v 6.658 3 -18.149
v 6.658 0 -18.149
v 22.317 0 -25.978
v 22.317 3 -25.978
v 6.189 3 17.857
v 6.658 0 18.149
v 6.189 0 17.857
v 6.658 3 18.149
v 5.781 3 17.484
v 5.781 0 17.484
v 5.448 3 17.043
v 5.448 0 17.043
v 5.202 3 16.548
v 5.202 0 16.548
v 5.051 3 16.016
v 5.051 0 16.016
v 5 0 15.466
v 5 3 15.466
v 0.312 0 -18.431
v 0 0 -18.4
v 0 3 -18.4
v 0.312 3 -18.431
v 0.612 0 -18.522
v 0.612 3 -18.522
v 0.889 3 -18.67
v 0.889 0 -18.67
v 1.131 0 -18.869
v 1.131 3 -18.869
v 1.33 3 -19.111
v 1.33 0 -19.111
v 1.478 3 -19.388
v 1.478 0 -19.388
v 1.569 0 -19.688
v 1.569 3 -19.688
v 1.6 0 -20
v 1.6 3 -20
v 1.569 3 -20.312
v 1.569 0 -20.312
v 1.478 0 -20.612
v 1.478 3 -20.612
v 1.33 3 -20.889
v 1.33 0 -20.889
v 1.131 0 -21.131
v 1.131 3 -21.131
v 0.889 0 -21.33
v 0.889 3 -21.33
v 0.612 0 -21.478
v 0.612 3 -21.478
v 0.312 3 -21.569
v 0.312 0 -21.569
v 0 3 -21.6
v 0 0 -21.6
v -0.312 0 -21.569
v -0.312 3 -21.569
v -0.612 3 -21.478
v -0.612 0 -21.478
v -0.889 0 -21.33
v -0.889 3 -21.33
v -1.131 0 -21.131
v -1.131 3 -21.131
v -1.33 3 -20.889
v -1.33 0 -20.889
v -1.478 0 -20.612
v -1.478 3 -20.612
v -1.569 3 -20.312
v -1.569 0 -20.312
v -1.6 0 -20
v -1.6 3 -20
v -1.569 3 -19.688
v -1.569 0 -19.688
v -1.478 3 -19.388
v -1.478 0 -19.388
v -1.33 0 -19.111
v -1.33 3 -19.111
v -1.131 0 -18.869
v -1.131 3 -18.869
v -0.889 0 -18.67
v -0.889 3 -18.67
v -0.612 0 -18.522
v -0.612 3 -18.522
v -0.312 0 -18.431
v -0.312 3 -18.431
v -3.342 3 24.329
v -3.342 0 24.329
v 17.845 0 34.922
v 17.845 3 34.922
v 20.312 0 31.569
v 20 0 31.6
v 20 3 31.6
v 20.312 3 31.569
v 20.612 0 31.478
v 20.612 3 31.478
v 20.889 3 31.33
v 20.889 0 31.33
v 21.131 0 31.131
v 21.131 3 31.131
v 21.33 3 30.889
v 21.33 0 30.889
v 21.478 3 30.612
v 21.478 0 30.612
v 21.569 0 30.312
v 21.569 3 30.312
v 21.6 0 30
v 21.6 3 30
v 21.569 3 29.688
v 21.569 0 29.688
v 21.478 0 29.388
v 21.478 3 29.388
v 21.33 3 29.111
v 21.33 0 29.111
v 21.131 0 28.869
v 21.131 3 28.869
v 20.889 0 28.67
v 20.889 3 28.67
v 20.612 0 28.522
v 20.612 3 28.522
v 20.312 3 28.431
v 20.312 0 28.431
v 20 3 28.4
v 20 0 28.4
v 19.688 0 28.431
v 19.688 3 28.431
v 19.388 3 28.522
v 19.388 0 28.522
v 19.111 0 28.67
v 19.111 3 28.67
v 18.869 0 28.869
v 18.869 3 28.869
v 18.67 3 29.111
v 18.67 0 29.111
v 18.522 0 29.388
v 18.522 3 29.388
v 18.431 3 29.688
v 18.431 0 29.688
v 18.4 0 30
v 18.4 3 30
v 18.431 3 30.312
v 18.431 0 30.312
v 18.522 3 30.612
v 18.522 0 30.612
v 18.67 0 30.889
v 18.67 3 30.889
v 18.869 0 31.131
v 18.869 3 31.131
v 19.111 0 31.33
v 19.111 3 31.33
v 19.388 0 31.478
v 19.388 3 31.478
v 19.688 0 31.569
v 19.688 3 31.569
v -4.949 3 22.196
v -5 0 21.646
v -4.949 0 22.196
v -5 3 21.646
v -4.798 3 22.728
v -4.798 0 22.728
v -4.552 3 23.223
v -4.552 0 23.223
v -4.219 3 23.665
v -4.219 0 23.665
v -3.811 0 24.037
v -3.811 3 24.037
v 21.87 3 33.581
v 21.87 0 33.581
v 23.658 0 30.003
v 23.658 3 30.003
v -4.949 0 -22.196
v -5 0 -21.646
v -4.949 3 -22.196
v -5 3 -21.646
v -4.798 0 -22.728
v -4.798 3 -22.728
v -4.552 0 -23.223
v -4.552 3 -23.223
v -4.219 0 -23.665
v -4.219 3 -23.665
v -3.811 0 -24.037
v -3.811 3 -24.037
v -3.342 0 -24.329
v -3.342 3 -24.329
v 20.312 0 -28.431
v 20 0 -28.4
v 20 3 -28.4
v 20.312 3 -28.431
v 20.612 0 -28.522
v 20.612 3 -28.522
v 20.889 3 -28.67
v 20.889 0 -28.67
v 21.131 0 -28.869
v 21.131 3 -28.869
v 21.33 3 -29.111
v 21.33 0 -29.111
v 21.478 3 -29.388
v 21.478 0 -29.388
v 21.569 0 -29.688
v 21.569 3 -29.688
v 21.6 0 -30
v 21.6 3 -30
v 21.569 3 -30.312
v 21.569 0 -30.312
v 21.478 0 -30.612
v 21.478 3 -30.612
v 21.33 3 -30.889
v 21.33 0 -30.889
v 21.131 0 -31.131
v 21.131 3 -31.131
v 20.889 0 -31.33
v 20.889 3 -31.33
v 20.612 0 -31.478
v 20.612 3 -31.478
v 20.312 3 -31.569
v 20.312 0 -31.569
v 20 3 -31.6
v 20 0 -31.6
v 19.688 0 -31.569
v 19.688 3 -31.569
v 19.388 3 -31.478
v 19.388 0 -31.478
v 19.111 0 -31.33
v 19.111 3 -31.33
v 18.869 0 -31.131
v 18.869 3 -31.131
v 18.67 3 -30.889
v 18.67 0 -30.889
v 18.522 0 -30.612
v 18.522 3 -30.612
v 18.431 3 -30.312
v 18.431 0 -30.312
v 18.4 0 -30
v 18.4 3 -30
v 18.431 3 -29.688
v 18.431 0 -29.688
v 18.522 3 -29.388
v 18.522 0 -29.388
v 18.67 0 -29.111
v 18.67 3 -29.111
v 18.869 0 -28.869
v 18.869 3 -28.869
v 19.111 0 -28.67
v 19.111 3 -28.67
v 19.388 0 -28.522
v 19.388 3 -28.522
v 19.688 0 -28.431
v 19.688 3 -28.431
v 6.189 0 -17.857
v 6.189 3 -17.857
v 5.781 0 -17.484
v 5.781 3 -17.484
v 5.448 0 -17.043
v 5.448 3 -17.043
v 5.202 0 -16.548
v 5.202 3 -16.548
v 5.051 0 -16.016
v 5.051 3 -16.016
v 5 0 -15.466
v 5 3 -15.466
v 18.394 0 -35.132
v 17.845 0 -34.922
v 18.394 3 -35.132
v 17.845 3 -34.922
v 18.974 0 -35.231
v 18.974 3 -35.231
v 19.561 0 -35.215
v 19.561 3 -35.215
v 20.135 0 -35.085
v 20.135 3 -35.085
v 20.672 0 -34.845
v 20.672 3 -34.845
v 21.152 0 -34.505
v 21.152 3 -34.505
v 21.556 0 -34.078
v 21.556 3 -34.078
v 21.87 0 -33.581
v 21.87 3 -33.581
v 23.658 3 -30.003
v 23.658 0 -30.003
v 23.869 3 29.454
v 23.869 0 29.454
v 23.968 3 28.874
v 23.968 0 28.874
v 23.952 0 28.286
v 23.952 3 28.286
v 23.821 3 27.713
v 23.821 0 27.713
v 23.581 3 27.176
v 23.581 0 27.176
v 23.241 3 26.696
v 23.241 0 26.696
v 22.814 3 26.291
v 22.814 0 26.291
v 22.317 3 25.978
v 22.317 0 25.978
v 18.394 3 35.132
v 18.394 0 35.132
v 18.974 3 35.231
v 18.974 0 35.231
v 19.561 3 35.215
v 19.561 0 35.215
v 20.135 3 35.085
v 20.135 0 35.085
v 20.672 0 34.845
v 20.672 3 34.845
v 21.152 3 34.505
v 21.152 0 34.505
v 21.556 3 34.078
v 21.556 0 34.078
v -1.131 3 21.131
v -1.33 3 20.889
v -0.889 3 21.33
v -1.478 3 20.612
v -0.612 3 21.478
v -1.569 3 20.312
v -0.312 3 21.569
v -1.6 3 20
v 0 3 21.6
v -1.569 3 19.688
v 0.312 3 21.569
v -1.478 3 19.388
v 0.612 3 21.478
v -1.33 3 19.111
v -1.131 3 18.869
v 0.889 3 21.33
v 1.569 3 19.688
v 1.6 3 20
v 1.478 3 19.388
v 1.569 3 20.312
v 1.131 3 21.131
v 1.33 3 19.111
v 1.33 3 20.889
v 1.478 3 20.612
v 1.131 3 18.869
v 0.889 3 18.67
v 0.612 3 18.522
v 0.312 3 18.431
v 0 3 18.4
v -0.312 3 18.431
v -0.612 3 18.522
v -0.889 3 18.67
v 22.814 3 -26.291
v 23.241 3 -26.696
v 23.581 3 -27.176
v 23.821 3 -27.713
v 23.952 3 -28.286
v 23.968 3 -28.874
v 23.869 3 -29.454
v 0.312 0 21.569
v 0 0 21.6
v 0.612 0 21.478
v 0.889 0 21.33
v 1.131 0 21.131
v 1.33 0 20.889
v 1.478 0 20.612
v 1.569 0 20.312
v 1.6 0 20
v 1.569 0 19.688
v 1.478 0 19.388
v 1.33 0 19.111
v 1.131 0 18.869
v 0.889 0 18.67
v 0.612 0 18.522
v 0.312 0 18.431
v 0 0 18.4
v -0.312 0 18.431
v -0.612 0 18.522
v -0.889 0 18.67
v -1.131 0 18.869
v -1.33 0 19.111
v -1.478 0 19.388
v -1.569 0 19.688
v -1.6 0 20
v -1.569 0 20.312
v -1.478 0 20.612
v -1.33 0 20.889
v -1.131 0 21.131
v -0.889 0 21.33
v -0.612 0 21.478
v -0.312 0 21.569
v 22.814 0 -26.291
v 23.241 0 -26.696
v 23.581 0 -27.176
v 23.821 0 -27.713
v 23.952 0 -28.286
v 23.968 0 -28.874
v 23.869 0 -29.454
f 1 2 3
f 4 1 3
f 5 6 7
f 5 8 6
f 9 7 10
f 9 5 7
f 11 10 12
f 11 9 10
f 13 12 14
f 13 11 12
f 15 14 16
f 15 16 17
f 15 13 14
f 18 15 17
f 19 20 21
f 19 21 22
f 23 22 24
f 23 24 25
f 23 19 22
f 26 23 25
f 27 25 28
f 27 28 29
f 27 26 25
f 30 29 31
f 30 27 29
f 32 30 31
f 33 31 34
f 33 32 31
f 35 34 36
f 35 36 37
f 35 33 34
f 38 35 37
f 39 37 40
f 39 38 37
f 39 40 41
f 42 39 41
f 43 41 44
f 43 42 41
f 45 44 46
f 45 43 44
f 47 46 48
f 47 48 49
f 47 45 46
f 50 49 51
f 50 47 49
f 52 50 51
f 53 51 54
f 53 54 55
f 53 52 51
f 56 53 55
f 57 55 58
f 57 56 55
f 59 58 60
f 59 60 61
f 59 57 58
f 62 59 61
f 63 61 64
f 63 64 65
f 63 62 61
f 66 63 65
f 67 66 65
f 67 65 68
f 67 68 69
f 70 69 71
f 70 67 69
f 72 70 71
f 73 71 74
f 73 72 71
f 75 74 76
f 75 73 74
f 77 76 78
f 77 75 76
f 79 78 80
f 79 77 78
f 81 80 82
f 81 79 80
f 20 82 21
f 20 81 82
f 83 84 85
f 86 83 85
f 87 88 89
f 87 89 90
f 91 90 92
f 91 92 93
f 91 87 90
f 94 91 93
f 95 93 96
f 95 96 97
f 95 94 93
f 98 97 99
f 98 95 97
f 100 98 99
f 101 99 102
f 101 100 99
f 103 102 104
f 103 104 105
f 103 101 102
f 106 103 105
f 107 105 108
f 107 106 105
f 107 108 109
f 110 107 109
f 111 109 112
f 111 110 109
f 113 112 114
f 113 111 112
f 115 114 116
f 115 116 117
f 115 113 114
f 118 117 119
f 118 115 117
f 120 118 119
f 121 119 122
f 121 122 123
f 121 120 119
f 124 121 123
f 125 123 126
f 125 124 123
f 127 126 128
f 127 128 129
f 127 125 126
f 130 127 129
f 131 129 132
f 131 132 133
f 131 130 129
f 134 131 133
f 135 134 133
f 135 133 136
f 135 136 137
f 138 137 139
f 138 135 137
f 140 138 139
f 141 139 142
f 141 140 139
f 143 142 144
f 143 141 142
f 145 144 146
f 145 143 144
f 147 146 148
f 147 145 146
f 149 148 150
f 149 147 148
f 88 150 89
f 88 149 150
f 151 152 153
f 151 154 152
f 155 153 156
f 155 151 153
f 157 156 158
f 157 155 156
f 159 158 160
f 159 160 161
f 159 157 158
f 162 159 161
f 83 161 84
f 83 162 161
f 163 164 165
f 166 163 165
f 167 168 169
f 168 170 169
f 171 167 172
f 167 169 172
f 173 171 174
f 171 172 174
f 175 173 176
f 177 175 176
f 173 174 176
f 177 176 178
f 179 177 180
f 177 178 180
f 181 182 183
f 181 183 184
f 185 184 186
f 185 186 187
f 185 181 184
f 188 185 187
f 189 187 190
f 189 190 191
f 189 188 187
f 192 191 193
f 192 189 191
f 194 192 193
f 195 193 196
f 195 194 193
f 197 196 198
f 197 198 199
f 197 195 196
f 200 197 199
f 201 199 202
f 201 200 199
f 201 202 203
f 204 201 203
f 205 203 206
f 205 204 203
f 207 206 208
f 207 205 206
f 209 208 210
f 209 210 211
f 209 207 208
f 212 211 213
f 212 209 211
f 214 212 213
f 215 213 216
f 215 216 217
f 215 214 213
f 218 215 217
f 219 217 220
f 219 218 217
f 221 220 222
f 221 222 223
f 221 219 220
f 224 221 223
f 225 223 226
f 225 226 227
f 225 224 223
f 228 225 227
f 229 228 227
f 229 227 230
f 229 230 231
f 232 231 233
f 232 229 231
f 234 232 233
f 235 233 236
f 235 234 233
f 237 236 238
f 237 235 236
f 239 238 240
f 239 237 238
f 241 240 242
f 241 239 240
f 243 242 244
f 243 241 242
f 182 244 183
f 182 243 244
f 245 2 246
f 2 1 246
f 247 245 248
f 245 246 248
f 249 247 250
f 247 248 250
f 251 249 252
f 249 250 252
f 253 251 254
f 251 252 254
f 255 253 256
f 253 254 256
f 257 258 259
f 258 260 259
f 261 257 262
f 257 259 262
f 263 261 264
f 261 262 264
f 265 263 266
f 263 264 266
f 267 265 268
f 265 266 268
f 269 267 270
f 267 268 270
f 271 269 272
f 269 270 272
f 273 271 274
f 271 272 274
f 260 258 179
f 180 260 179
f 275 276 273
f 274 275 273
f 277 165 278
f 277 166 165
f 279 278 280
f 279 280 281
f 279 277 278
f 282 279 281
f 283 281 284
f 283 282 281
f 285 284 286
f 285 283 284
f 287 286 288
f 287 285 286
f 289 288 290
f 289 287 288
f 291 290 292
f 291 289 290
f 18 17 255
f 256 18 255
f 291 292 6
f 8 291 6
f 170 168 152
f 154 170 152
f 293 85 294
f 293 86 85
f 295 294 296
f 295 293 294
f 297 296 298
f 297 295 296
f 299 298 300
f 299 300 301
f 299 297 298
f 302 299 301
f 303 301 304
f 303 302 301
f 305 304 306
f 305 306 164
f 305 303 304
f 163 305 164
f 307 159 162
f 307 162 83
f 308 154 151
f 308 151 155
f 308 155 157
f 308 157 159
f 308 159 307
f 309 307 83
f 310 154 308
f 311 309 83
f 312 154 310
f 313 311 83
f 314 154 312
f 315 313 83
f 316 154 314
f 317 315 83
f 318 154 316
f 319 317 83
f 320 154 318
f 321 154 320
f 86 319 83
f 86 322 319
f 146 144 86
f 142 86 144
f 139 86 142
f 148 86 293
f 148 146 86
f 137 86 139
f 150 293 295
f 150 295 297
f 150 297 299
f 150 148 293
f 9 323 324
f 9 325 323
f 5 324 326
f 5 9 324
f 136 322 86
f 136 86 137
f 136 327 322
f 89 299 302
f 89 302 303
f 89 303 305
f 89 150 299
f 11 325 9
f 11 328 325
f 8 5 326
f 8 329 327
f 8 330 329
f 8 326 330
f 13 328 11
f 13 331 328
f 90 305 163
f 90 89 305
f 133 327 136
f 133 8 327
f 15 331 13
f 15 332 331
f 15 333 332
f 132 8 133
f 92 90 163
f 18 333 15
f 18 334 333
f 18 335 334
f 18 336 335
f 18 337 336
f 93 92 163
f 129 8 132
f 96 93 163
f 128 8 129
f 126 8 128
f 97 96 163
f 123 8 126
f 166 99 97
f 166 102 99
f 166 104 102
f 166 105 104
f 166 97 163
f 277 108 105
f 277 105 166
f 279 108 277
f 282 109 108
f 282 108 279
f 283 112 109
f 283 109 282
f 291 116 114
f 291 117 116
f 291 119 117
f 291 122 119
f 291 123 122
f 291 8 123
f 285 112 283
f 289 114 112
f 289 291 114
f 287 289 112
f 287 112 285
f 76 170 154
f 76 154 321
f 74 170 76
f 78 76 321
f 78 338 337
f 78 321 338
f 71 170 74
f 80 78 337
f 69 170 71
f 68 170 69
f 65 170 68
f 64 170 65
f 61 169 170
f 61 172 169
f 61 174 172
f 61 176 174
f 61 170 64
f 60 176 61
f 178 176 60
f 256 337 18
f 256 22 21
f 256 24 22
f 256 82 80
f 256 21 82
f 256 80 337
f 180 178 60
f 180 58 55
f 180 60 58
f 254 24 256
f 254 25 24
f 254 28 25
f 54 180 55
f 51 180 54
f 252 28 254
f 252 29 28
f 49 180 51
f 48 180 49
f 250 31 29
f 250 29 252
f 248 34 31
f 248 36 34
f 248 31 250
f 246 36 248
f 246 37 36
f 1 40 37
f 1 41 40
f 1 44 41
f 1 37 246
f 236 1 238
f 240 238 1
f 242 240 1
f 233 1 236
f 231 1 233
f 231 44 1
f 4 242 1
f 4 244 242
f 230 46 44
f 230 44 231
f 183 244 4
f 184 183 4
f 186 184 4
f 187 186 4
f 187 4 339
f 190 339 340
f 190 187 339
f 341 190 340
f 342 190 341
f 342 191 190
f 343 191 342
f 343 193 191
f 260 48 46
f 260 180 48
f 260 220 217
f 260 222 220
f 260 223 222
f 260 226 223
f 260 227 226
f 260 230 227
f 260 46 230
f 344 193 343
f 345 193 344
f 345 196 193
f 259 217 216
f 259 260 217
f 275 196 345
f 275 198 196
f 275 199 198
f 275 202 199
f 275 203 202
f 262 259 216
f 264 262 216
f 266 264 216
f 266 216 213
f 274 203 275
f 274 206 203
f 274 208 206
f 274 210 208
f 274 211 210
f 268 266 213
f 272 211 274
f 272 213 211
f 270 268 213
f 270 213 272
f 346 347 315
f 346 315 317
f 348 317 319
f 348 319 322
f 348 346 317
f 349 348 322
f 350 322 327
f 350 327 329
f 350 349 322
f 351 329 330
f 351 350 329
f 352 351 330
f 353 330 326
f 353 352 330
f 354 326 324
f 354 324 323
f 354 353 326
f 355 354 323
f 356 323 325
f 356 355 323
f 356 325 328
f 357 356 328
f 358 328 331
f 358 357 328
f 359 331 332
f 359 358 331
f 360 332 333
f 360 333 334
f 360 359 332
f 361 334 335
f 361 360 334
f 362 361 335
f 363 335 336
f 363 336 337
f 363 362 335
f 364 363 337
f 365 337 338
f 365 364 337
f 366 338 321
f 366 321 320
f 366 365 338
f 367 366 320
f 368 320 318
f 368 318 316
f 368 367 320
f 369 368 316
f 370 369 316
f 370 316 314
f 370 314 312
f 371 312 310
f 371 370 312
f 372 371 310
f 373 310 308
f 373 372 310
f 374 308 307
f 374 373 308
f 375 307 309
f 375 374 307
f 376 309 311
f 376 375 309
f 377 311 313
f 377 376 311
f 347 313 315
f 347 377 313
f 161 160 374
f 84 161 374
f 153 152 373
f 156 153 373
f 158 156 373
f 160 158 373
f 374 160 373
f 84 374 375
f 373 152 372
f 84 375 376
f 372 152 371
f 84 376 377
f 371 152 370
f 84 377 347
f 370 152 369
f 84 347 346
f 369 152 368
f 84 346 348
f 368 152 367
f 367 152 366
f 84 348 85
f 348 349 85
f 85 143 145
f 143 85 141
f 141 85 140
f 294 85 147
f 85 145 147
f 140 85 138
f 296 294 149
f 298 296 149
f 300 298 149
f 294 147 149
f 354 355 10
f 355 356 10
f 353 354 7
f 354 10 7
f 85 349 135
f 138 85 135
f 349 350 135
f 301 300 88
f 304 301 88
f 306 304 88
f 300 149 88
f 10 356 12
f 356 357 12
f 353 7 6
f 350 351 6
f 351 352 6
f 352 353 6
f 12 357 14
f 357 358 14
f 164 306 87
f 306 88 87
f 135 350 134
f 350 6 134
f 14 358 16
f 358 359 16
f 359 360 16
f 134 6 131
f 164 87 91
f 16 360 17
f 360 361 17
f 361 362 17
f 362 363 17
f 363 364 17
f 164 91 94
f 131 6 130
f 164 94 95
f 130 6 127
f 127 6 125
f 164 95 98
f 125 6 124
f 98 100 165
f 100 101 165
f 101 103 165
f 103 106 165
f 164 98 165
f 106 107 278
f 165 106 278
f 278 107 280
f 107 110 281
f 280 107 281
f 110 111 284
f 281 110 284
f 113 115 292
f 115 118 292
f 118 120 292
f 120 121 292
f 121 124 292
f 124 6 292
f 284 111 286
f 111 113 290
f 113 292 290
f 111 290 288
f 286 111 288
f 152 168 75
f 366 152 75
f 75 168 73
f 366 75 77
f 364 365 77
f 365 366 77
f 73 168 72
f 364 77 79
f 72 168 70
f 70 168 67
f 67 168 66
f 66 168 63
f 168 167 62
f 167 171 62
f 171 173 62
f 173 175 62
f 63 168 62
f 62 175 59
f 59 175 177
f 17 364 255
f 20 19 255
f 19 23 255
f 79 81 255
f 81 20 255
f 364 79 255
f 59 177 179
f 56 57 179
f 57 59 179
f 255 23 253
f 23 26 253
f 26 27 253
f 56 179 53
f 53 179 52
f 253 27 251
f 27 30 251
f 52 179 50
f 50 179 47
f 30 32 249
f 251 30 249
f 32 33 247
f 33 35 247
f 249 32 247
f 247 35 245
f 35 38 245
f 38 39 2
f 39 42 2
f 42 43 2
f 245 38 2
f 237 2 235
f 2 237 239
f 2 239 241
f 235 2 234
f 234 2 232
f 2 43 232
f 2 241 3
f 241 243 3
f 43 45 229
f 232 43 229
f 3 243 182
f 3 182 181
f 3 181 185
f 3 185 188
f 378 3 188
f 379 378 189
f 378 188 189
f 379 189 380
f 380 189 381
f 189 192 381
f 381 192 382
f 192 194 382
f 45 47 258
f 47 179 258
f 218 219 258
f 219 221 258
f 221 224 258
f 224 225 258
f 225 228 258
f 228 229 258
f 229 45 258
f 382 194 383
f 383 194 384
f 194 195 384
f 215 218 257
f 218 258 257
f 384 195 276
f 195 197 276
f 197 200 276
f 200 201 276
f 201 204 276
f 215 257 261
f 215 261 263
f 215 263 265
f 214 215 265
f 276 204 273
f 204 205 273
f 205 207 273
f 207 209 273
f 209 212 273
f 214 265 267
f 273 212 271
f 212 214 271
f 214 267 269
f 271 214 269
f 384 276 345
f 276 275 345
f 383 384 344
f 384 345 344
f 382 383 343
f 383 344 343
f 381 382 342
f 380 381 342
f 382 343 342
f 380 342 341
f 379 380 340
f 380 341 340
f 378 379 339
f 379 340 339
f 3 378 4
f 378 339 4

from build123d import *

# Parameters (mm, degrees)
CROQUIS1_R              = 1.6
SALIENTE_EXTRUIR1_DEPTH = 3
REDONDEO1_R             = 3


with BuildPart() as part:
    # Croquis1 → Saliente-Extruir1 (new body)
    with BuildSketch(Plane(origin=(0, 0, 0), x_dir=(1, 0, 0), z_dir=(0, 1, 0))):
        Polygon((-5, 23.5), (-5, -23.5), (20.527864045, -36.263932023), (25, -27.319660113), (5, -17.319660113), (5, 17.319660113), (25, 27.319660113), (20.527864045, 36.263932023), align=None)
        with Locations(Location((0, 20, 0), (0, 0, 270))):
            Circle(CROQUIS1_R, mode=Mode.SUBTRACT)
        with Locations(Location((0, -20, 0), (0, 0, 270))):
            Circle(CROQUIS1_R, mode=Mode.SUBTRACT)
        with Locations(Location((20, 30, 0), (0, 0, 270))):
            Circle(CROQUIS1_R, mode=Mode.SUBTRACT)
        with Locations(Location((20, -30, 0), (0, 0, 270))):
            Circle(CROQUIS1_R, mode=Mode.SUBTRACT)
    extrude(amount=SALIENTE_EXTRUIR1_DEPTH)

    # Redondeo1
    redondeo1_edges = [part.edges().sort_by_distance(p)[0] for p in [
        (25, 1.5, 27.319660113),
        (20.527864045, 1.5, 36.263932023),
        (-5, 1.5, 23.5),
        (-5, 1.5, -23.5),
        (20.527864045, 1.5, -36.263932023),
        (25, 1.5, -27.319660113),
        (5, 1.5, -17.319660113),
        (5, 1.5, 17.319660113),
    ]]
    fillet(redondeo1_edges, radius=REDONDEO1_R)


solid = part.part
